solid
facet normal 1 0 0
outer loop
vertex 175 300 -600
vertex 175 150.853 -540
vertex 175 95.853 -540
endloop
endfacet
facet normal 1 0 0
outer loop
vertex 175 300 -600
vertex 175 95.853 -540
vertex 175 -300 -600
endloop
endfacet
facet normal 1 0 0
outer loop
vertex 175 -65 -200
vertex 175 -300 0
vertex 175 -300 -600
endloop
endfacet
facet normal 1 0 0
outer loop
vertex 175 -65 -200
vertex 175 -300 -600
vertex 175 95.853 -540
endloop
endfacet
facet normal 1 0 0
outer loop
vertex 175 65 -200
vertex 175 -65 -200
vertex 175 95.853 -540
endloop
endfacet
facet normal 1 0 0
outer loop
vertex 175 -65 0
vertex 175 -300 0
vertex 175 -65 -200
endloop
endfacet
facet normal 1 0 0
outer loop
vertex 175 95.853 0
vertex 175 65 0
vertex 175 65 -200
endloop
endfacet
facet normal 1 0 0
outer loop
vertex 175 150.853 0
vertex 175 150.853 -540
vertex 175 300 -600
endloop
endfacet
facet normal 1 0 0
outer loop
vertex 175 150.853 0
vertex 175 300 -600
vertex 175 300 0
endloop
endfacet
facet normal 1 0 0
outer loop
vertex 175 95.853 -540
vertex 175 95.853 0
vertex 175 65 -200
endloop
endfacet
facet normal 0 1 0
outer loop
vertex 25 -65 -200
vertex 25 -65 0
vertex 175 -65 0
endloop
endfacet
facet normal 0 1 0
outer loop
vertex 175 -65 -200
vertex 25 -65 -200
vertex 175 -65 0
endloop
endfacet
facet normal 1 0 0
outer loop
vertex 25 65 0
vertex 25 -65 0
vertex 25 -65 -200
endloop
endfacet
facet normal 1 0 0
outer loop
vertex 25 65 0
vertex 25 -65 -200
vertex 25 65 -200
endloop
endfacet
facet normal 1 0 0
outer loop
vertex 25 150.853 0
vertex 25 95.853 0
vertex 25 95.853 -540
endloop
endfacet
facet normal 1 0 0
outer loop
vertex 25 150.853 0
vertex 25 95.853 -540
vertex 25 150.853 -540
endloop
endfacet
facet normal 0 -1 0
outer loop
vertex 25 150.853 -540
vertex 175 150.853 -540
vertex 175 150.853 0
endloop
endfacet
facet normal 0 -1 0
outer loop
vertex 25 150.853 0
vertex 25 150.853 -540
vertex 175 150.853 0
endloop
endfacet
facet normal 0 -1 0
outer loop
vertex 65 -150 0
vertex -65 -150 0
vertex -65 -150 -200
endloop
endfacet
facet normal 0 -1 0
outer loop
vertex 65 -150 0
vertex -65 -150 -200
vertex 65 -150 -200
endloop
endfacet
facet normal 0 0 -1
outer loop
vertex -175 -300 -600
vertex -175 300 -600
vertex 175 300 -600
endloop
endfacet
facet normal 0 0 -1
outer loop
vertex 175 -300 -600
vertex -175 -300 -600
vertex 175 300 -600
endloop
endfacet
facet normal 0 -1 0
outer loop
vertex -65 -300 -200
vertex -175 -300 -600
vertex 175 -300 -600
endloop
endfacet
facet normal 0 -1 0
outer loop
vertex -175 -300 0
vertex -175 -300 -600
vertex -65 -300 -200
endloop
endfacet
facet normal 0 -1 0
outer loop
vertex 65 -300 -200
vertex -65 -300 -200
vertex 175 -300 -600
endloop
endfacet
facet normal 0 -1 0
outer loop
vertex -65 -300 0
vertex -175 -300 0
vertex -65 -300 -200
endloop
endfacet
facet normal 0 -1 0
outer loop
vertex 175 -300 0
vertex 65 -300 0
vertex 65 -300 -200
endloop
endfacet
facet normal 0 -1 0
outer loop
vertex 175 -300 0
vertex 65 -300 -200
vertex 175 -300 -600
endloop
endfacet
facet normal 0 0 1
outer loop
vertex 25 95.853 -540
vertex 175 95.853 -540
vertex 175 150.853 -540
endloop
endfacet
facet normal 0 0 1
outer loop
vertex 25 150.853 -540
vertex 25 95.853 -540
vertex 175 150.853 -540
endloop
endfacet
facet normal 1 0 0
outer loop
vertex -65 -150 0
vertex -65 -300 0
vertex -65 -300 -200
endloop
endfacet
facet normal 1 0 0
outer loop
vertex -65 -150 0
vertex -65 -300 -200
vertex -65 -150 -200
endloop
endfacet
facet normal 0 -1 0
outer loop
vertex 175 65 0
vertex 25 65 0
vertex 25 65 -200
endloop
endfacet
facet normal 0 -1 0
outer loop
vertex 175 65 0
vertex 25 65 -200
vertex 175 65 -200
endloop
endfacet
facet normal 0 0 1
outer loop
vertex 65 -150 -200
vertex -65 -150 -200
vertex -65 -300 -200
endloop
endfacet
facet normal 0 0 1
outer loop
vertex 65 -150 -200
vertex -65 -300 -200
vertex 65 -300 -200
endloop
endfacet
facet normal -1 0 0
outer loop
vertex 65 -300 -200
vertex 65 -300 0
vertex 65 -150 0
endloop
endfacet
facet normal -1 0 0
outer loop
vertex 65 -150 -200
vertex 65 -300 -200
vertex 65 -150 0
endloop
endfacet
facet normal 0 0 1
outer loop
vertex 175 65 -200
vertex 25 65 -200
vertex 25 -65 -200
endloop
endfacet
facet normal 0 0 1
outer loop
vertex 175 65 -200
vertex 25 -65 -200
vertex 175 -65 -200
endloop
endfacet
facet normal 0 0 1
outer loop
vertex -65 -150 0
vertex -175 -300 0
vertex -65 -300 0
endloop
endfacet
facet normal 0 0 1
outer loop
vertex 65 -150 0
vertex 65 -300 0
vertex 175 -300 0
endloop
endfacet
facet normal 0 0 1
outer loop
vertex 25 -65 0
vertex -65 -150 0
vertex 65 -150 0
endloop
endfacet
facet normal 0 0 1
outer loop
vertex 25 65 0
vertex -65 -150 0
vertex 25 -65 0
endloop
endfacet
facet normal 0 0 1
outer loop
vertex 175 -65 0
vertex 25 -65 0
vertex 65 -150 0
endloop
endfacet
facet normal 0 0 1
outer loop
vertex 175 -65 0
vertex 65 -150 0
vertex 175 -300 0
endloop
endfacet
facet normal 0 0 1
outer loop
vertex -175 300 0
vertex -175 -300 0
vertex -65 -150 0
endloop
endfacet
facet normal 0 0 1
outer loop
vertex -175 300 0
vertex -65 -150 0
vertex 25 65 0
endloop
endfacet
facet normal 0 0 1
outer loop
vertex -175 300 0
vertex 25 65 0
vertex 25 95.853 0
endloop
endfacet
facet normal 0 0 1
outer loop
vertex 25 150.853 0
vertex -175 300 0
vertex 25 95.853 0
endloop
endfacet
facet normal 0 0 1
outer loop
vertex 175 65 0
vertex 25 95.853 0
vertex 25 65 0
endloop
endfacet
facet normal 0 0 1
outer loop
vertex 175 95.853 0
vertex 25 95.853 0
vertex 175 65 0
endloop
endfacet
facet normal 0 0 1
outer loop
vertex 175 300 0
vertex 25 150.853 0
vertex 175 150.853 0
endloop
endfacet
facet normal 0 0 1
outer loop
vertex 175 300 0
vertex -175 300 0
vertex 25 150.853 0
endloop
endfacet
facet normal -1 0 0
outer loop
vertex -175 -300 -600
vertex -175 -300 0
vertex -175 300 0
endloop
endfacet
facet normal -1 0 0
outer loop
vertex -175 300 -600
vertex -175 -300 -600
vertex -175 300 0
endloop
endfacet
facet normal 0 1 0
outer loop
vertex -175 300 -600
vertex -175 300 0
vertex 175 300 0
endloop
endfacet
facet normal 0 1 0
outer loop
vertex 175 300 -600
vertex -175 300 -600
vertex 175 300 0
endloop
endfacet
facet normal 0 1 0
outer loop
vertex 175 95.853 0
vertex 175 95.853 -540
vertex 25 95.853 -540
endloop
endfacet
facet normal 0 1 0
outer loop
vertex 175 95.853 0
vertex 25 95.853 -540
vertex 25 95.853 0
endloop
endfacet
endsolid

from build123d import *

# Parameters (mm, degrees)
F4_W      = 350
F4_H      = 600
F5_DEPTH  = 600
F6_W      = 130
F6_H      = 150
F6_W_2    = 150
F6_H_2    = 130
F7_DEPTH  = 200
F8_W      = 55
F8_H      = 540
F10_DEPTH = 150


# Not quite as in the source:
# - a feature names something its author has since deleted; it is built from what else it names


with BuildPart() as f5:
    # F4 (on Top) → F5 (new body)
    with BuildSketch(Plane.XY):
        Rectangle(F4_W, F4_H)
    extrude(amount=-F5_DEPTH)

    # F6 (on face) → F7 (cut)
    with BuildSketch(Plane.XY):
        with Locations((0, -225)):
            Rectangle(F6_W, F6_H)
        with Locations((100, 0)):
            Rectangle(F6_W_2, F6_H_2)
    extrude(amount=-F7_DEPTH, mode=Mode.SUBTRACT)

    # F8 (on face) → F10 (cut)
    with BuildSketch(Plane.YZ.offset(175)):
        with Locations((123.3525127172, -270)):
            Rectangle(F8_W, F8_H)
    extrude(amount=-F10_DEPTH, mode=Mode.SUBTRACT)


solid = f5.part
